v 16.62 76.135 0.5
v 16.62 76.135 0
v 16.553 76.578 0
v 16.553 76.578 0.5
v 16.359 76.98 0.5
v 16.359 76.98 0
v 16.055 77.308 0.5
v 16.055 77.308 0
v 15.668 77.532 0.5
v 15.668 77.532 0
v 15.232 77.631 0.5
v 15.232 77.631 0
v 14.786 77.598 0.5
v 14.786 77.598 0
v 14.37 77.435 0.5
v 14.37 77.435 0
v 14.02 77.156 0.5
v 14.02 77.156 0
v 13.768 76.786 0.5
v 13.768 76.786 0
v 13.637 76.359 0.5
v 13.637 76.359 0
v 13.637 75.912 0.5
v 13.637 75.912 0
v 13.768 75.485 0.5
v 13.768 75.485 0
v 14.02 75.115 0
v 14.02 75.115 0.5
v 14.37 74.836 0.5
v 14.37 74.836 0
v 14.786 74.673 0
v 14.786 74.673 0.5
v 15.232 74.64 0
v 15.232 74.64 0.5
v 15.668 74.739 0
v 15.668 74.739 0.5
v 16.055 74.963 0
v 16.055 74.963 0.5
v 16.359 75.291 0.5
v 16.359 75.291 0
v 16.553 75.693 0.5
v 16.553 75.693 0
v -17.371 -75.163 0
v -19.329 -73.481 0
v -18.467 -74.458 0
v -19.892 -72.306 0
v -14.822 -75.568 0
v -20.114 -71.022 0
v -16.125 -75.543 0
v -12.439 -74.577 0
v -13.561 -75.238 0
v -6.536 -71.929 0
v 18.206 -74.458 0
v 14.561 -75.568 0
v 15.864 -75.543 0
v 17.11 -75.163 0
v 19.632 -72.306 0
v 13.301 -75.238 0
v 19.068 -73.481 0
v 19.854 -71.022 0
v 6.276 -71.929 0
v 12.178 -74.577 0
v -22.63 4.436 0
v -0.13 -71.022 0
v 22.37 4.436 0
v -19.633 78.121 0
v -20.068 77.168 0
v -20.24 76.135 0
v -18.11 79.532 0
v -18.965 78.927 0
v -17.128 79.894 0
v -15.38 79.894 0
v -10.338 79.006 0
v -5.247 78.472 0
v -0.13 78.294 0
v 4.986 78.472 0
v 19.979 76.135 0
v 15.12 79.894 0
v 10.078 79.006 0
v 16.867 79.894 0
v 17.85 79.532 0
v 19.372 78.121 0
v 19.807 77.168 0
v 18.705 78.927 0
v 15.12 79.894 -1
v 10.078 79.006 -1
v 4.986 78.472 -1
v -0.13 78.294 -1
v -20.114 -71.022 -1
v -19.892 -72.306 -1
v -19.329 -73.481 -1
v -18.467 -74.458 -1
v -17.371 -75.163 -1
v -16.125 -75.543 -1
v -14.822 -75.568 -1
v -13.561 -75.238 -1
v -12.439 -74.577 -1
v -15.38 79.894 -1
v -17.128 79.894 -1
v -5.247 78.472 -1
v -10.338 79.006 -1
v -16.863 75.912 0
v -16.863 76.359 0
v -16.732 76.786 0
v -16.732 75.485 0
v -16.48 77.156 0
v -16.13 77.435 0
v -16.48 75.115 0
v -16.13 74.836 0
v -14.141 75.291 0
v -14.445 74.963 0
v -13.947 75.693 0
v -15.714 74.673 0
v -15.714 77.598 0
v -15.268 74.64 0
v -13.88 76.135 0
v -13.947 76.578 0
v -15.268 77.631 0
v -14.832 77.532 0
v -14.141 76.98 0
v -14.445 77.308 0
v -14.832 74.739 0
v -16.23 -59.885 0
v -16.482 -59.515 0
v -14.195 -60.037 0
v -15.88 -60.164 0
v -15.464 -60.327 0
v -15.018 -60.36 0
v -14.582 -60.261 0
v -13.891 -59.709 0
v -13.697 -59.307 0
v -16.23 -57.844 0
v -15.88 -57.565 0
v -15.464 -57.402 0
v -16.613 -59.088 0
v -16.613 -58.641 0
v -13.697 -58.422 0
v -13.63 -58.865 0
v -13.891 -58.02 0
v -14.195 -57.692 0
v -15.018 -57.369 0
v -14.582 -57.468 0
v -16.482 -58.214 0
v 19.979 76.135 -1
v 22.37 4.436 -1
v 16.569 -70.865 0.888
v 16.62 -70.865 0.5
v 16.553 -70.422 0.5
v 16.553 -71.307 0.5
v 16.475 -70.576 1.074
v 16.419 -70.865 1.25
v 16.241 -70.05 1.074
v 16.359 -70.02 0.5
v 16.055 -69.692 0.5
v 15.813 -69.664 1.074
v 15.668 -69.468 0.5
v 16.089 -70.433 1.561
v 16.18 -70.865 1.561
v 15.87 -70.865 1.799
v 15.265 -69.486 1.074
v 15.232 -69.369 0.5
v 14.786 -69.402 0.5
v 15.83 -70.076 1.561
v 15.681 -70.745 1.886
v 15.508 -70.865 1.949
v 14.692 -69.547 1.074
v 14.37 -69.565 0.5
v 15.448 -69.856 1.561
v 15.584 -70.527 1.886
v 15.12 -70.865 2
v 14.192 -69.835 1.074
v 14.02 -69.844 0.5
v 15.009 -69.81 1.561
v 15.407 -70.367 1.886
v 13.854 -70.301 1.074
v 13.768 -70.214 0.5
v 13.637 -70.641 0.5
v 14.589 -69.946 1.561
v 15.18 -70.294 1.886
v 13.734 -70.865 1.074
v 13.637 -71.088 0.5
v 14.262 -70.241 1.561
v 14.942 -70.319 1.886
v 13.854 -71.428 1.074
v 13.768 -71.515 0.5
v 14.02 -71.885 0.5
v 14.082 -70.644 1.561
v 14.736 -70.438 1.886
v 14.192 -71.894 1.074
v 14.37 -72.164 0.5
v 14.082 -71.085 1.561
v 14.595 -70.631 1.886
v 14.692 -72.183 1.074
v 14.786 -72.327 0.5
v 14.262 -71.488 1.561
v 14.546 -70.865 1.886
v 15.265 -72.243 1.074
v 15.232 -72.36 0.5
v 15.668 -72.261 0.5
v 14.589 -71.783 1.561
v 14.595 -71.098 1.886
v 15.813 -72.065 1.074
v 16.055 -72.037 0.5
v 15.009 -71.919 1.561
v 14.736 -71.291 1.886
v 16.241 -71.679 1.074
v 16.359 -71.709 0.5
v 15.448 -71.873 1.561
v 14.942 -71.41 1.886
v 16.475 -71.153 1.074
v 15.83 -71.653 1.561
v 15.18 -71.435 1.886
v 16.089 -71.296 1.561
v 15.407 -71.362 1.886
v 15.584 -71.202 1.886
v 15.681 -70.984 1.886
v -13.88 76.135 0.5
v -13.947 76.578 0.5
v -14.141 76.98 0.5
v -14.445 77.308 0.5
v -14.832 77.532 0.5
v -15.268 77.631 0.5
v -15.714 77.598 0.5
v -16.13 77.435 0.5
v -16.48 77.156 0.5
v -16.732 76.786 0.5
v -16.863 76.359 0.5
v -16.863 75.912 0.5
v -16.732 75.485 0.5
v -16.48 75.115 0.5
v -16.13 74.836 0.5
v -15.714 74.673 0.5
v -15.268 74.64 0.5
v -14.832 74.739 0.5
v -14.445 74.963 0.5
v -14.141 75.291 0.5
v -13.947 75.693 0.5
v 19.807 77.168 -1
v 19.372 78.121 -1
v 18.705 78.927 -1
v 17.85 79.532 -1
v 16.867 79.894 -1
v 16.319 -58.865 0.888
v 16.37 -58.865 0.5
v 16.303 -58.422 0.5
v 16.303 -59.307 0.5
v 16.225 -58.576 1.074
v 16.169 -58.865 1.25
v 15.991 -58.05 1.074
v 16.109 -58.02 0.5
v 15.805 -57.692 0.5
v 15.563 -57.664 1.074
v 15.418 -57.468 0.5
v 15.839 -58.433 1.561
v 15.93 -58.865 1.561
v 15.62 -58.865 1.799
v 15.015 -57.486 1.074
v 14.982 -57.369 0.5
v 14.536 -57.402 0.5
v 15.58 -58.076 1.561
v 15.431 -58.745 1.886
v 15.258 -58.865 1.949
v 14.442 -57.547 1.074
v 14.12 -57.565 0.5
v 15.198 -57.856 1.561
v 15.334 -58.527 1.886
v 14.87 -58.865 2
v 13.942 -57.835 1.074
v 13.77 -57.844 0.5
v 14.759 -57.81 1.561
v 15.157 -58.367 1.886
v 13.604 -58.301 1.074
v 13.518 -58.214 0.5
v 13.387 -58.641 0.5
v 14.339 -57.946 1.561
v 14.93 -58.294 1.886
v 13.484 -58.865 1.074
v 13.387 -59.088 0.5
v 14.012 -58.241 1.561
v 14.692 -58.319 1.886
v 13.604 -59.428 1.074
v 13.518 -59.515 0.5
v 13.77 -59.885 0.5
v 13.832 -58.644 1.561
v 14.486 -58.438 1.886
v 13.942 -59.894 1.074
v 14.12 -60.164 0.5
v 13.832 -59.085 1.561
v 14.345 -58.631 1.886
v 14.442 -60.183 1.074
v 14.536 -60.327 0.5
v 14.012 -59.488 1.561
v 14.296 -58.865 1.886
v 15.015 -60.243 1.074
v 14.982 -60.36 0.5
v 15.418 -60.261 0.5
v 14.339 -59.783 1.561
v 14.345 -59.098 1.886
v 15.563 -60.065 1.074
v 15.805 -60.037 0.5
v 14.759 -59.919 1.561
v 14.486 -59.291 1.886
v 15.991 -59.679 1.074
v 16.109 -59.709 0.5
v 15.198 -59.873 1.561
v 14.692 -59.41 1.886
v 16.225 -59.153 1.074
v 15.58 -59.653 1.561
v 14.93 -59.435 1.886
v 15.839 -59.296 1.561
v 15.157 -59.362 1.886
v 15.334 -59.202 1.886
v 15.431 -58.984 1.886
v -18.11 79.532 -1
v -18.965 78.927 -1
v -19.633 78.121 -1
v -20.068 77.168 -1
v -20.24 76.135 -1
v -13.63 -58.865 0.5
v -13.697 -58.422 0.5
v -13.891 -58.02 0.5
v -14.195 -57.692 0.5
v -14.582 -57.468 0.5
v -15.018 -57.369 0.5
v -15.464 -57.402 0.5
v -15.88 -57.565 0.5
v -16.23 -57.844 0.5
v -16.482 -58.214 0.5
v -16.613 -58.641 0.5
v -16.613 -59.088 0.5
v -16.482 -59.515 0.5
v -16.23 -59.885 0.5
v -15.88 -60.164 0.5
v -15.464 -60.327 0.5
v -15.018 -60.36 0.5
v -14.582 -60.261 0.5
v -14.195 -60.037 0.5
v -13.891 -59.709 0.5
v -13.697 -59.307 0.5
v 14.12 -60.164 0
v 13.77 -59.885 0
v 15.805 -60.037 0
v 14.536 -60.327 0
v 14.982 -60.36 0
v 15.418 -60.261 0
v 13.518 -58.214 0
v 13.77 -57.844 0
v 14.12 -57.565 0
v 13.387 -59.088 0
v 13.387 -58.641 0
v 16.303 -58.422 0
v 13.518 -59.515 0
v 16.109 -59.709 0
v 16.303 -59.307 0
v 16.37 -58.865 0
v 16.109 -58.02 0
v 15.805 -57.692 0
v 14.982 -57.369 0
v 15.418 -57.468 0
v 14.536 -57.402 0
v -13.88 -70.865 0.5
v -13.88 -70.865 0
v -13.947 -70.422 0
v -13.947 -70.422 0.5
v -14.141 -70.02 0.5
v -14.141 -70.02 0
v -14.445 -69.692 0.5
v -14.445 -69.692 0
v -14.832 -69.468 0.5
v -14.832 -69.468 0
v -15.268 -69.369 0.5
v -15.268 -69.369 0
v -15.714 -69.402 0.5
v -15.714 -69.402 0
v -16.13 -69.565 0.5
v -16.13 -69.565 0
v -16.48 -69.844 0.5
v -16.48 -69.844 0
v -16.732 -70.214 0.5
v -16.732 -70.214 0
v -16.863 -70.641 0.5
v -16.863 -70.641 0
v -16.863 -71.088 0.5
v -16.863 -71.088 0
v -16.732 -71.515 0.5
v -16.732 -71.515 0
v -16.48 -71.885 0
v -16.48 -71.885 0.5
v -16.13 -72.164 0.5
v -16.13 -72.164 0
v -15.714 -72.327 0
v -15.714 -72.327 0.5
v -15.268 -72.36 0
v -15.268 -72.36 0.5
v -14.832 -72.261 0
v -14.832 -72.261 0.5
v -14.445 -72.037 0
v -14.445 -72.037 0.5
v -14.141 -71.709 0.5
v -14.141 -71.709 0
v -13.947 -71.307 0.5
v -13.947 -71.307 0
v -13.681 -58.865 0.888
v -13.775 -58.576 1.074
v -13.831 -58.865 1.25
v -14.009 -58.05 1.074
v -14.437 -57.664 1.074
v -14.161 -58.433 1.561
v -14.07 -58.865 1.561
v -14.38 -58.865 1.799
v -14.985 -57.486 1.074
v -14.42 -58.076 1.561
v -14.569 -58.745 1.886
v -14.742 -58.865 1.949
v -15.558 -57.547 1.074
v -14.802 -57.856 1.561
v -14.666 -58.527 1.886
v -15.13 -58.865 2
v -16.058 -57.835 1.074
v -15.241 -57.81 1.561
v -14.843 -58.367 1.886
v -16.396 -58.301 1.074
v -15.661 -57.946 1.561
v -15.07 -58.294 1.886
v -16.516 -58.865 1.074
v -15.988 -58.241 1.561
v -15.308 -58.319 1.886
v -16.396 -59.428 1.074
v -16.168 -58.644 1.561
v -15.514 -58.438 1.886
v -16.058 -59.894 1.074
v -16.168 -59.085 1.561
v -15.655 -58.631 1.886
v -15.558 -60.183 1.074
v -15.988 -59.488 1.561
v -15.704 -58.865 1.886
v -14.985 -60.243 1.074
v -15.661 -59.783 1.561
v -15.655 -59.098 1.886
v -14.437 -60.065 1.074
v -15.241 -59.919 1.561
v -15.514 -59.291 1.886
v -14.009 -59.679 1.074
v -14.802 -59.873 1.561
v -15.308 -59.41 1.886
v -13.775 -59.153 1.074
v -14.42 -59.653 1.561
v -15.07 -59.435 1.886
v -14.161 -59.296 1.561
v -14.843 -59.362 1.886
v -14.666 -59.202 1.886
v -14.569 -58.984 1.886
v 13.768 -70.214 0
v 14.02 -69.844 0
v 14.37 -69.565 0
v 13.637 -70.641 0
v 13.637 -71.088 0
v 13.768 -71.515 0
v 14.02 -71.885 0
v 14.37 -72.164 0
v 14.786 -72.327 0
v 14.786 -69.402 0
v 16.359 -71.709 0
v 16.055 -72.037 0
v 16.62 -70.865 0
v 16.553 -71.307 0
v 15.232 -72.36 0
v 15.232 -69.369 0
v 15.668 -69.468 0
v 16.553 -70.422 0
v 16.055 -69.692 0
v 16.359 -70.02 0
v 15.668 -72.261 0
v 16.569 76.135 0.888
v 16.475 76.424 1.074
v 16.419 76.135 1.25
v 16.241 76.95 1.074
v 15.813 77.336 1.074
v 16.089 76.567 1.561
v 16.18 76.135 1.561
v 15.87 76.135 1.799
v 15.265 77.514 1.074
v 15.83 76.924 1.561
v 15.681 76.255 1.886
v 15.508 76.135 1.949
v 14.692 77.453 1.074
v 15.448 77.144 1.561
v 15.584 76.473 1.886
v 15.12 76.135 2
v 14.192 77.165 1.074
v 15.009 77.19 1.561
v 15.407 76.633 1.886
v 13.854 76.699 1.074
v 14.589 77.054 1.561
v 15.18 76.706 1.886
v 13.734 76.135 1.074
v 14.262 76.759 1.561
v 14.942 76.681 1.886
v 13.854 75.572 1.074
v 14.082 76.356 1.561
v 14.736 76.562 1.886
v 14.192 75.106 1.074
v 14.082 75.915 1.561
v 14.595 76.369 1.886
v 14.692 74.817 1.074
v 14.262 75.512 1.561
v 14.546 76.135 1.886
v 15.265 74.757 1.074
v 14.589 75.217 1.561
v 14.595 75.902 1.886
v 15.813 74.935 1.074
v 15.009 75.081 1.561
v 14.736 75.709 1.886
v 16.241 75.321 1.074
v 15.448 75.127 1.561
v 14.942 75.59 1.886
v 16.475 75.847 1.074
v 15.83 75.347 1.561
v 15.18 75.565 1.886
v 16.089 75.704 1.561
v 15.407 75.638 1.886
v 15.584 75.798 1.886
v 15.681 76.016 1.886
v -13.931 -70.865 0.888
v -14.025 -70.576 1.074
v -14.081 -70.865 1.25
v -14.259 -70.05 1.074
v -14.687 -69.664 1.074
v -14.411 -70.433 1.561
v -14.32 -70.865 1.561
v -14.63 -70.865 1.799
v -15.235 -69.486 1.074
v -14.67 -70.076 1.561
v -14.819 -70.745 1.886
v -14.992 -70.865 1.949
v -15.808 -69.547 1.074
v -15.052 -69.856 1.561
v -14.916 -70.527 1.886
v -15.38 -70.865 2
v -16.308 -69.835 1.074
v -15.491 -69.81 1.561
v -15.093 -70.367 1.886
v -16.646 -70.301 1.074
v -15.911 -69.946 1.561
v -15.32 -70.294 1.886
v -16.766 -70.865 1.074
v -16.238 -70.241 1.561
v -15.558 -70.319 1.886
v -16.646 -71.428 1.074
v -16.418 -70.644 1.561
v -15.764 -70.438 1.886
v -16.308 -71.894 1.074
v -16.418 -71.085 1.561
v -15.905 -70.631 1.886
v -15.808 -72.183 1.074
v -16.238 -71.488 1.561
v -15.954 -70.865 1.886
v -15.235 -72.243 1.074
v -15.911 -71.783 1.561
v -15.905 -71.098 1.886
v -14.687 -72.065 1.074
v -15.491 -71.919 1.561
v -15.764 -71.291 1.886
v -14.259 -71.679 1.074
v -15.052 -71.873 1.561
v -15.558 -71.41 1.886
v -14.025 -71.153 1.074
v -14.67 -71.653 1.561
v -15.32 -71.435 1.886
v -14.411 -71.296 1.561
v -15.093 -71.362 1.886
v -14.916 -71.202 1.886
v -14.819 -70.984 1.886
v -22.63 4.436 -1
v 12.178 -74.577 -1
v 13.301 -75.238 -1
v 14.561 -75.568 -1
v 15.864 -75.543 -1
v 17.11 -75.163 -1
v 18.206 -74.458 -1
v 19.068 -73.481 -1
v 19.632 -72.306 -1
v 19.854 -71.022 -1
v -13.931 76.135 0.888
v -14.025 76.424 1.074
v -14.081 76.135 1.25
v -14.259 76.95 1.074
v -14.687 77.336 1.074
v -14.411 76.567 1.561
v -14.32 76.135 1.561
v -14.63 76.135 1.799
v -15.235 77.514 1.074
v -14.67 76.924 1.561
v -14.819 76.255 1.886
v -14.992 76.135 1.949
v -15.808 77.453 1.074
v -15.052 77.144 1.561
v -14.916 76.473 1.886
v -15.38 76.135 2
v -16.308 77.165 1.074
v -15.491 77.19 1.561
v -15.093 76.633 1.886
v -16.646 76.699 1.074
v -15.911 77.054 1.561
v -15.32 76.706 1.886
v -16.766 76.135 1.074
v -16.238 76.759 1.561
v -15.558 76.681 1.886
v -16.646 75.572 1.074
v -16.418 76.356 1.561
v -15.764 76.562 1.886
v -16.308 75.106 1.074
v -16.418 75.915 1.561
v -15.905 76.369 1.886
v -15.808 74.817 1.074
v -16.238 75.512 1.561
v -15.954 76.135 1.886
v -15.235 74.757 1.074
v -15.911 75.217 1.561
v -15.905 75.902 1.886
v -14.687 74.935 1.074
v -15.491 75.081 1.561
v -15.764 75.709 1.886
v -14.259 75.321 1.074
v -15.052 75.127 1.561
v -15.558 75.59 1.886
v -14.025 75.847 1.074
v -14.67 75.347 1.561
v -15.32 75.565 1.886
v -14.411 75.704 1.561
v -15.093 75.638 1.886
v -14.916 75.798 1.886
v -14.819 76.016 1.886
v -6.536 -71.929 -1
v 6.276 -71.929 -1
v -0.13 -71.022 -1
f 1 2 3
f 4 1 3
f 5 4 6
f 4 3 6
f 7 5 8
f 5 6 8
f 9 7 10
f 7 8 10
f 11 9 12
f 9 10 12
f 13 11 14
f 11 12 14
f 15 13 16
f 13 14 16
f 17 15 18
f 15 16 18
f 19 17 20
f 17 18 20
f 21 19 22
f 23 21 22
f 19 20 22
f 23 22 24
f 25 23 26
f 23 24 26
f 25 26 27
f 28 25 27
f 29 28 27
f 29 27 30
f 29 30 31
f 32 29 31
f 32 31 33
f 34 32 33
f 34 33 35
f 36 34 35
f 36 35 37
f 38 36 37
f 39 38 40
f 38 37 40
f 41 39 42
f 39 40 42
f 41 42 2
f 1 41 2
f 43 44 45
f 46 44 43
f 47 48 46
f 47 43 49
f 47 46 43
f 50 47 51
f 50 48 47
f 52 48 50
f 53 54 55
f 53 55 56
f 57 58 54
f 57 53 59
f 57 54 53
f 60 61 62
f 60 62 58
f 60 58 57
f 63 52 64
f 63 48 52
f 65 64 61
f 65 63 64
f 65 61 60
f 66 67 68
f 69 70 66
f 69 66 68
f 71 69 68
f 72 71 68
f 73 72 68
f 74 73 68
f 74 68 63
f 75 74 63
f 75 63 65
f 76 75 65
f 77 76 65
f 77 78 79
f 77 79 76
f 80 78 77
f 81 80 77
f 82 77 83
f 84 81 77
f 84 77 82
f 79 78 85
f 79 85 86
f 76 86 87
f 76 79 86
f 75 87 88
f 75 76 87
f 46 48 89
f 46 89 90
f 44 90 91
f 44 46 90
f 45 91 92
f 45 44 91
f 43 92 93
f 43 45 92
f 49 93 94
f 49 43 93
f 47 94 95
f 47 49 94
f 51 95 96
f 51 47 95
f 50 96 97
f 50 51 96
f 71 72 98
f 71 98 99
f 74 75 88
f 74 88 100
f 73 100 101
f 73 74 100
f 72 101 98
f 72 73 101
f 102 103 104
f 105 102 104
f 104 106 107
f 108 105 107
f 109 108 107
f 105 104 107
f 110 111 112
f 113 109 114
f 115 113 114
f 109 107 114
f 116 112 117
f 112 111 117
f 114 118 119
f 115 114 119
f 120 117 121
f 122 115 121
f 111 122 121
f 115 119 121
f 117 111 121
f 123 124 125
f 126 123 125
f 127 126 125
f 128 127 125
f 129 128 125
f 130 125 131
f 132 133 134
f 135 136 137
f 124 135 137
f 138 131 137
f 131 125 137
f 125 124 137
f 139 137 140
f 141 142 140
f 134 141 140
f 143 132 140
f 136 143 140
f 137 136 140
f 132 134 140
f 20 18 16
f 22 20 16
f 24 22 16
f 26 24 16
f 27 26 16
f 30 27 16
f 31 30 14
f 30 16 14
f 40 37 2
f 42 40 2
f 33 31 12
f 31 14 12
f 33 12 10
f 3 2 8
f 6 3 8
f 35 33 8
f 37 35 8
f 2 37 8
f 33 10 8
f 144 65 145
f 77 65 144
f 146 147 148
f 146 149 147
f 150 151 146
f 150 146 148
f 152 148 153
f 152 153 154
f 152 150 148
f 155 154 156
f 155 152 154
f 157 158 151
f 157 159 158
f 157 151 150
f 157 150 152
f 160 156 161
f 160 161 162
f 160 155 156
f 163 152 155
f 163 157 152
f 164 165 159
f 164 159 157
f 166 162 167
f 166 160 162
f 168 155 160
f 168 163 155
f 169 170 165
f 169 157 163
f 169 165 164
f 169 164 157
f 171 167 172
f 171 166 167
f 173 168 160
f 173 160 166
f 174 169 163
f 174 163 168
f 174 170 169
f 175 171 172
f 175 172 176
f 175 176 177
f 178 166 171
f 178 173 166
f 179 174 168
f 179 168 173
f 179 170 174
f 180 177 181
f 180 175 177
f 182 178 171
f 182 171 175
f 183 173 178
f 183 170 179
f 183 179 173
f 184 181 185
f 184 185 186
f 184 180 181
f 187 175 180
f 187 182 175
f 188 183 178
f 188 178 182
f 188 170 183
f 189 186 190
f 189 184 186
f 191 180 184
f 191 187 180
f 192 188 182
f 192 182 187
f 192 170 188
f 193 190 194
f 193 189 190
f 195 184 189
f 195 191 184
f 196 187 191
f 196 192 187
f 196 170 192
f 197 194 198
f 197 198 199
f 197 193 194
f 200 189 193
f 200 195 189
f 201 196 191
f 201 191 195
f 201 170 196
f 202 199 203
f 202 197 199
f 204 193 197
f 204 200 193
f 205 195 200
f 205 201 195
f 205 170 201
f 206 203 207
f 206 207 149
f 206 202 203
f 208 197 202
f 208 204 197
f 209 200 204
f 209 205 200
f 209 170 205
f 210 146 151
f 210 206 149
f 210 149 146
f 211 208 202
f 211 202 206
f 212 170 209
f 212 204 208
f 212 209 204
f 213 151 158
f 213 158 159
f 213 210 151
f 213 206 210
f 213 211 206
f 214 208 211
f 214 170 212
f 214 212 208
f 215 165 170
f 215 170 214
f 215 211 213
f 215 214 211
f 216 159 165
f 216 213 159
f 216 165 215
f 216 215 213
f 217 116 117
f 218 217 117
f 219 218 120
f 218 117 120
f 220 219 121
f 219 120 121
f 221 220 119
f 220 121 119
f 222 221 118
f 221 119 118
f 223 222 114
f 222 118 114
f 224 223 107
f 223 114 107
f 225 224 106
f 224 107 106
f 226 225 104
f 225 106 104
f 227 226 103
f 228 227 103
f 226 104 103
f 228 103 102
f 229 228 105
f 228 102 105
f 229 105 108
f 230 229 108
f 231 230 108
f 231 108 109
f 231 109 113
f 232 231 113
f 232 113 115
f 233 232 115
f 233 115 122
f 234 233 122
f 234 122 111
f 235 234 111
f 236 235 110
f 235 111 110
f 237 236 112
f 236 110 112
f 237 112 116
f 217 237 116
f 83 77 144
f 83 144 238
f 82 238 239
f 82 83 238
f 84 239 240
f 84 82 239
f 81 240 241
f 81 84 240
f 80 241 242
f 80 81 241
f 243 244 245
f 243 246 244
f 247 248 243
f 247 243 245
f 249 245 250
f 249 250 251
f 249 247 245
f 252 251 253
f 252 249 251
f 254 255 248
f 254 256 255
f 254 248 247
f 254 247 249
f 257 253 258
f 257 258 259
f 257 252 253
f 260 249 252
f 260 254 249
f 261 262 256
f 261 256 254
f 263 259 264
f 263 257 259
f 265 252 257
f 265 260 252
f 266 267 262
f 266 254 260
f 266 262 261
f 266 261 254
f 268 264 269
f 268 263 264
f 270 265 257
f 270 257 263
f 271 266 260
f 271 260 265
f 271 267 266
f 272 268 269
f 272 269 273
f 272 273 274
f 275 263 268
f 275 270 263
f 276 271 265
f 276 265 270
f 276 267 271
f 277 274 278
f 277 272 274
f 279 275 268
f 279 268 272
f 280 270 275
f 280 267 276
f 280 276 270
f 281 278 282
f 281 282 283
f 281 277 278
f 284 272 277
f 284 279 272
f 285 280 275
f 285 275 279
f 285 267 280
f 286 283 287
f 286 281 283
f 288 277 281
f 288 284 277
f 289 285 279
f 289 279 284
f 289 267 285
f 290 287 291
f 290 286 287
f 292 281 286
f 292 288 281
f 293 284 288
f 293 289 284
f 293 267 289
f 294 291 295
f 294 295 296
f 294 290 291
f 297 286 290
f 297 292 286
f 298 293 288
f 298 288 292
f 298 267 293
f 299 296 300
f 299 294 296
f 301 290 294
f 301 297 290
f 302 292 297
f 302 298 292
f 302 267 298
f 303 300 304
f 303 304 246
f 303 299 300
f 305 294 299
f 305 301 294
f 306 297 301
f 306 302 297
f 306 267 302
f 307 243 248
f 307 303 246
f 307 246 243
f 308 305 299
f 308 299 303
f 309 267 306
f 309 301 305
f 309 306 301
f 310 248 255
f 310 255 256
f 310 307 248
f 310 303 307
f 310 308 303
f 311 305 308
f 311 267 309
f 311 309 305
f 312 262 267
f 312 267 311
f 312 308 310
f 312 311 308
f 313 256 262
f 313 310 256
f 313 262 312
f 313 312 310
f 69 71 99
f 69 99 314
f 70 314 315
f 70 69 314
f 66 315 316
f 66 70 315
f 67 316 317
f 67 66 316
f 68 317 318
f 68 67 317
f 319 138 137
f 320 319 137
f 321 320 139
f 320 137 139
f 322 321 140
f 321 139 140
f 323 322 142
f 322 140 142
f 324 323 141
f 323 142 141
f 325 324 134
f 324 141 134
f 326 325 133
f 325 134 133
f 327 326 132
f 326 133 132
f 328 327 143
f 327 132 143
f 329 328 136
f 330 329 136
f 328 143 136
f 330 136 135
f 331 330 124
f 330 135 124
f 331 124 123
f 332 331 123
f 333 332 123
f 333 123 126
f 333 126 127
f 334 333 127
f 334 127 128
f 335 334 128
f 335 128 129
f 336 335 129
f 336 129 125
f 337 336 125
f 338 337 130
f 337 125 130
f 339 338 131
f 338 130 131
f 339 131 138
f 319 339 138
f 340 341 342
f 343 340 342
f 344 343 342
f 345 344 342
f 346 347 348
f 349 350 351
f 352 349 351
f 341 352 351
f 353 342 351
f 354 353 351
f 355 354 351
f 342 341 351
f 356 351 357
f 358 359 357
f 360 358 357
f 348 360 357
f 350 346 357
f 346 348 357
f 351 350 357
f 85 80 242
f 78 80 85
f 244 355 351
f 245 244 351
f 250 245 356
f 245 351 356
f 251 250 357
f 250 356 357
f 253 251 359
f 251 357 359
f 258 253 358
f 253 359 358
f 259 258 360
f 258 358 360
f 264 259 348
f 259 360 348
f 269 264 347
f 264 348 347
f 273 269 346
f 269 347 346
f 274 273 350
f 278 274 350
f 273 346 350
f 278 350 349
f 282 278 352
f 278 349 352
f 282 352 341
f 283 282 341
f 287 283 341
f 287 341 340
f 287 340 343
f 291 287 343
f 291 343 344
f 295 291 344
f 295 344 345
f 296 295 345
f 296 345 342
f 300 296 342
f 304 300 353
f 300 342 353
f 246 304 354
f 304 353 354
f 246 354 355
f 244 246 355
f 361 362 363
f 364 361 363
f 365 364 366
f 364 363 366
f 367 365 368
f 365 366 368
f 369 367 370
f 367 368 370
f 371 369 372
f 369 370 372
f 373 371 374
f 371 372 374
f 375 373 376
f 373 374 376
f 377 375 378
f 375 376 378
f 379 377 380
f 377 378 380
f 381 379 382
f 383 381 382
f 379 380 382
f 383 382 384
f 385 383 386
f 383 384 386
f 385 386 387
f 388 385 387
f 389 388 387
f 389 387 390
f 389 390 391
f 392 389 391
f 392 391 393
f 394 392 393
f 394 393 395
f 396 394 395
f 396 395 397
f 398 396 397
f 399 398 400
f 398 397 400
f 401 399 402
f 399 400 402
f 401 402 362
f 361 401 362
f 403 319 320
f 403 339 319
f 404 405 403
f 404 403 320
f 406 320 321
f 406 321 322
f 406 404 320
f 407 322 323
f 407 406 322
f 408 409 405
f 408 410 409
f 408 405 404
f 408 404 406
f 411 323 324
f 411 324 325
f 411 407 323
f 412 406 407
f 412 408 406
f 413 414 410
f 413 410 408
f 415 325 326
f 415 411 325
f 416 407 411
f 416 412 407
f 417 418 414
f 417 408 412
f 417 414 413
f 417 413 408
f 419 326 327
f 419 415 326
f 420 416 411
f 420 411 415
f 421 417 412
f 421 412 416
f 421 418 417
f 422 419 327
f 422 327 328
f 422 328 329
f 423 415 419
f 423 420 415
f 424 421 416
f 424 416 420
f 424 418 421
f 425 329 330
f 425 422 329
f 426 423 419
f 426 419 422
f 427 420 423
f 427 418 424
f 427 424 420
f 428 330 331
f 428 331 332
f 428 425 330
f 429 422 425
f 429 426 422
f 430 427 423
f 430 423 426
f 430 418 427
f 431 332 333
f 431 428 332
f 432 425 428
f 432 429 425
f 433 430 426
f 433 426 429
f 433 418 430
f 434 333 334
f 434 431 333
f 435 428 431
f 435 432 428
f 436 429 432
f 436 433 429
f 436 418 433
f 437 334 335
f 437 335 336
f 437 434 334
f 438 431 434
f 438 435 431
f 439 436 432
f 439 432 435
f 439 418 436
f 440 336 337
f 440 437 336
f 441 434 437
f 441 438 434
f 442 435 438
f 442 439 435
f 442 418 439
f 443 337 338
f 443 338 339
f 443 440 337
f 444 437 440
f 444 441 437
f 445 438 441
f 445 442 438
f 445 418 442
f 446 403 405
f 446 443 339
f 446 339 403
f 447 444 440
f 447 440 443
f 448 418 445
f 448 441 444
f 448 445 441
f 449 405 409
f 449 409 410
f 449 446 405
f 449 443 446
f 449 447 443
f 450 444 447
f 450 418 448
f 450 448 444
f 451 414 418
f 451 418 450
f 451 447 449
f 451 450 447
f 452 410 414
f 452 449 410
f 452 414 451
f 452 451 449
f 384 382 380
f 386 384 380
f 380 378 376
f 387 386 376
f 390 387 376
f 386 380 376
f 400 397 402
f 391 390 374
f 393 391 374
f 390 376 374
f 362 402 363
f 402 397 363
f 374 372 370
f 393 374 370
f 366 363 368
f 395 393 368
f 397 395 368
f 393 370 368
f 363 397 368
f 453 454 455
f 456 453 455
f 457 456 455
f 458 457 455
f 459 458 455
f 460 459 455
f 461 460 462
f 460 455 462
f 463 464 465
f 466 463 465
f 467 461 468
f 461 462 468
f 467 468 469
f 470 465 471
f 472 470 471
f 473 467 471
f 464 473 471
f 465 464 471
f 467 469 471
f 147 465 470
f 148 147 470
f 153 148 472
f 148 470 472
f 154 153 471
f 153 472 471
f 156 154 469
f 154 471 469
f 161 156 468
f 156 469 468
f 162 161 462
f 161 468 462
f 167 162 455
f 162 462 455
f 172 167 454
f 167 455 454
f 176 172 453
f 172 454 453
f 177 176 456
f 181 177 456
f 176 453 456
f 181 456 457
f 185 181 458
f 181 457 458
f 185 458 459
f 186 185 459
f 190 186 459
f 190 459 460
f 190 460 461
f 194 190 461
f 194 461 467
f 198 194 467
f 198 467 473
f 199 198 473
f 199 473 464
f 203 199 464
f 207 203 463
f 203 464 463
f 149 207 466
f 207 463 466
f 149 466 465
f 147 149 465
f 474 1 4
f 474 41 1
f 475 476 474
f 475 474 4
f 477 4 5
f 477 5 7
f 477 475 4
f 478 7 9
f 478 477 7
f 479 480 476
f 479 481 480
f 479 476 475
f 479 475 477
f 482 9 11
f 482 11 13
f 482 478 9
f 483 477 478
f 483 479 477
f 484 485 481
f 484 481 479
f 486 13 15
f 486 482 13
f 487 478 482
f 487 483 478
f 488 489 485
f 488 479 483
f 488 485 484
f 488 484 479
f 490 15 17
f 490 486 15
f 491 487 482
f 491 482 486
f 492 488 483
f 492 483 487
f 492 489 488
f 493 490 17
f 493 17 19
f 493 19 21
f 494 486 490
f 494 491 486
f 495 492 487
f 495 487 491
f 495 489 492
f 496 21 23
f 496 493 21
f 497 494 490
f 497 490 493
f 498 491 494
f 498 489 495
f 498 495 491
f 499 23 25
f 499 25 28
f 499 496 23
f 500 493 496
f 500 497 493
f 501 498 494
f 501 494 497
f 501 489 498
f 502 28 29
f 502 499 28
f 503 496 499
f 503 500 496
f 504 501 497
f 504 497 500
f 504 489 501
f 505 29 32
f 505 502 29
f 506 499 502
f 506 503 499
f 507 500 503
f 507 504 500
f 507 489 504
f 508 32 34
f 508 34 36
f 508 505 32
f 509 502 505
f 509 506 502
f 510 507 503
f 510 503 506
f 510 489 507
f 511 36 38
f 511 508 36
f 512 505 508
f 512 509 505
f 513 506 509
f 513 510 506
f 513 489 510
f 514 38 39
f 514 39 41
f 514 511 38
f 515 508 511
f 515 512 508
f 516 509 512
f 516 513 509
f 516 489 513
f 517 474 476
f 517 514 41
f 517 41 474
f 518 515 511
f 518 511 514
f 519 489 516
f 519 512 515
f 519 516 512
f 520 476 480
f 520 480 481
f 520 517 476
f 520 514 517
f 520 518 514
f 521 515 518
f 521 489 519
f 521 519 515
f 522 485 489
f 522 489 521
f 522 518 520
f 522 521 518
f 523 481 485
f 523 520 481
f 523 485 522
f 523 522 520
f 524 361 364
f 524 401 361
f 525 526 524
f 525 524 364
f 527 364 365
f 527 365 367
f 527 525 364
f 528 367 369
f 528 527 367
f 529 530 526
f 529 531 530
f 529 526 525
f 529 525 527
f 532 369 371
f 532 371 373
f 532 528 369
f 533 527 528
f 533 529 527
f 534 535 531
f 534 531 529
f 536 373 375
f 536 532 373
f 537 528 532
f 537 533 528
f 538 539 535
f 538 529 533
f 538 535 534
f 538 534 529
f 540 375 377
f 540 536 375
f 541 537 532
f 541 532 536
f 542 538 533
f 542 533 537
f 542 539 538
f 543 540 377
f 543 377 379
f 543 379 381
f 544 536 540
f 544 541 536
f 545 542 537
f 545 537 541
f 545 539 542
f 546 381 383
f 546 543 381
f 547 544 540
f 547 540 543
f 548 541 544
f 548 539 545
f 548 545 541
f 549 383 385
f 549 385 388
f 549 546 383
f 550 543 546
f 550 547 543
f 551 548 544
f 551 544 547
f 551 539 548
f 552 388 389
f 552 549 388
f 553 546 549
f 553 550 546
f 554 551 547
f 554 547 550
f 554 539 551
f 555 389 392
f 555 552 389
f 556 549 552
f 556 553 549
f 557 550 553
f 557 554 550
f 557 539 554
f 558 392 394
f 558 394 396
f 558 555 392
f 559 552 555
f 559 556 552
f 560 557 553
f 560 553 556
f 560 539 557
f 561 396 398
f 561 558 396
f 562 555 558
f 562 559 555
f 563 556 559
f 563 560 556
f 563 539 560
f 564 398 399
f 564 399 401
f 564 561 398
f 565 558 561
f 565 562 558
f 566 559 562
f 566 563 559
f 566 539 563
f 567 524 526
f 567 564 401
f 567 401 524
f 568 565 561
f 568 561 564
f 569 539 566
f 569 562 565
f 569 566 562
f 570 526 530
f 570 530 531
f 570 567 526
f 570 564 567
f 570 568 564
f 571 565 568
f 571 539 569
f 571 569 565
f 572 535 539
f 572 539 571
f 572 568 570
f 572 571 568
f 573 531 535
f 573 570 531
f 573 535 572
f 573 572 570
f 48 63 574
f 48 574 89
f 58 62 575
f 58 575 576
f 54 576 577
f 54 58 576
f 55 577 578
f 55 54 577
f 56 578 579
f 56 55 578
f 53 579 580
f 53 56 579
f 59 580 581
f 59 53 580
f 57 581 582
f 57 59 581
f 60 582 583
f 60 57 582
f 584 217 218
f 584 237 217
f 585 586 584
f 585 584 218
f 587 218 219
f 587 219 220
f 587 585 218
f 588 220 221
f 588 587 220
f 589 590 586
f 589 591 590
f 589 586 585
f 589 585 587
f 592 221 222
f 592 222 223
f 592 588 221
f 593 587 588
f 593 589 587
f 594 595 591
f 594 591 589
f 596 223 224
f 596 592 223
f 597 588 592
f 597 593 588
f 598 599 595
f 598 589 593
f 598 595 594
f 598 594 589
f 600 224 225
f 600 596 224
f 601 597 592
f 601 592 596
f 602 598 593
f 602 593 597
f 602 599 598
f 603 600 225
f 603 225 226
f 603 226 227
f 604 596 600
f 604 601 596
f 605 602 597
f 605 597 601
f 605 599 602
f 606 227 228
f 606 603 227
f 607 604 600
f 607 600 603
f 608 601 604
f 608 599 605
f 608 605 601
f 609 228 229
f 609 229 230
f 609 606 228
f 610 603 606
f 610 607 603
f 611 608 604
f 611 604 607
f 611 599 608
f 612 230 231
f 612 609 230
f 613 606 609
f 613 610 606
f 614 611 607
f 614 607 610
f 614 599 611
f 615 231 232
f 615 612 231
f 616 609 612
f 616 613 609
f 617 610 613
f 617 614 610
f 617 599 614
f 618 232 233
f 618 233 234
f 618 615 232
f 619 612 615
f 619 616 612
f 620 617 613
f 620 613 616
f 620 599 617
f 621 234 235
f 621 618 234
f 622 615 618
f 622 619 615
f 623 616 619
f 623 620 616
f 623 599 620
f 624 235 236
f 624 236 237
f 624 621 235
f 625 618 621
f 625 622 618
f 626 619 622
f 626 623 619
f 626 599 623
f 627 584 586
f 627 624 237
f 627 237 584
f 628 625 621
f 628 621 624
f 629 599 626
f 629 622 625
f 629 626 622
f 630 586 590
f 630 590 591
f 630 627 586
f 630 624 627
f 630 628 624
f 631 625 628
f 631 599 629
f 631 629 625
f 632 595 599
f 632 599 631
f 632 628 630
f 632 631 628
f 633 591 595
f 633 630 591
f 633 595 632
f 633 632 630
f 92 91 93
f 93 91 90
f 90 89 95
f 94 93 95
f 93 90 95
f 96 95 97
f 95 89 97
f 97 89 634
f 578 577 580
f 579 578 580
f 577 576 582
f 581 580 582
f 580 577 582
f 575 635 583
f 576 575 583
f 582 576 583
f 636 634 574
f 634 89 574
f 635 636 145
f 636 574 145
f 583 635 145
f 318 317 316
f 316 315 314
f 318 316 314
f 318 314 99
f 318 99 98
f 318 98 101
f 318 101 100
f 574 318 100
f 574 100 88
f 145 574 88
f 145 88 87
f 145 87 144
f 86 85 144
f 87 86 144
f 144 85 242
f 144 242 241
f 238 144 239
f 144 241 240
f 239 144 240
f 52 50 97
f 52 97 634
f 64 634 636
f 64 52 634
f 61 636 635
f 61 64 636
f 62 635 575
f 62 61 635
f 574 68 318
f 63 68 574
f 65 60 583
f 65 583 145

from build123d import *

# Parameters (mm, degrees)
F0_R     = 1.5
F1_DEPTH = 2
F2_DEPTH = 1
F3_R     = 1.5


with BuildPart() as f1:
    # F0 (on Top) → F1 (new body)
    with BuildSketch(Plane.XY):
        with Locations((15.119787, -70.86451)):
            Circle(F0_R)
        with Locations((14.869787, -58.86451)):
            Circle(F0_R)
        with Locations((-15.380213, -70.86451)):
            Circle(F0_R)
        with Locations((-15.130213, -58.86451)):
            Circle(F0_R)
        with Locations((15.119787, 76.13549)):
            Circle(F0_R)
        with Locations((-15.380213, 76.13549)):
            Circle(F0_R)
    extrude(amount=F1_DEPTH)

    # F3
    f3_edges = [f1.edges().sort_by_distance(p)[0] for p in [
        (13.619787, 76.13549, 2),
        (-16.880213, 76.13549, 2),
        (13.369787, -58.86451, 2),
        (13.619787, -70.86451, 2),
        (-16.630213, -58.86451, 2),
        (-16.880213, -70.86451, 2),
    ]]
    fillet(f3_edges, radius=F3_R)


with BuildPart() as f2:
    # F0 (on Top) → F2 (new body)
    with BuildSketch(Plane.XY):
        with BuildLine():
            ThreePointArc((-17.127601, 79.893801), (-19.325559, 78.546167), (-20.23977, 76.13549))
            Line((-20.23977, 76.13549), (-22.630213, 4.435727))
            Line((-22.630213, 4.435727), (-20.114469, -71.022348))
            ThreePointArc((-20.114469, -71.022348), (-17.370904, -75.162794), (-12.438595, -74.577322))
            ThreePointArc((-12.438595, -74.577322), (-0.130213, -71.022348), (12.178169, -74.577322))
            ThreePointArc((12.178169, -74.577322), (17.110477, -75.162794), (19.854043, -71.022348))
            Line((19.854043, -71.022348), (22.369787, 4.435727))
            Line((22.369787, 4.435727), (19.979344, 76.13549))
            ThreePointArc((19.979344, 76.13549), (19.065133, 78.546167), (16.867174, 79.893801))
            Line((16.867174, 79.893801), (15.119787, 79.893801))
            ThreePointArc((15.119787, 79.893801), (7.536639, 78.694896), (-0.130213, 78.293801))
            ThreePointArc((-0.130213, 78.293801), (-7.797066, 78.694896), (-15.380213, 79.893801))
            Line((-15.380213, 79.893801), (-17.127601, 79.893801))
        make_face()
        with Locations((-15.380213, -70.86451)):
            Circle(F0_R, mode=Mode.SUBTRACT)
        with Locations((-15.130213, -58.86451)):
            Circle(F0_R, mode=Mode.SUBTRACT)
        with Locations((15.119787, -70.86451)):
            Circle(F0_R, mode=Mode.SUBTRACT)
        with Locations((14.869787, -58.86451)):
            Circle(F0_R, mode=Mode.SUBTRACT)
        with Locations((-15.380213, 76.13549)):
            Circle(F0_R, mode=Mode.SUBTRACT)
        with Locations((15.119787, 76.13549)):
            Circle(F0_R, mode=Mode.SUBTRACT)
        with Locations((-15.130213, -58.86451)):
            Circle(F0_R)
        with Locations((-15.380213, -70.86451)):
            Circle(F0_R)
        with Locations((15.119787, -70.86451)):
            Circle(F0_R)
        with Locations((14.869787, -58.86451)):
            Circle(F0_R)
        with Locations((15.119787, 76.13549)):
            Circle(F0_R)
        with Locations((-15.380213, 76.13549)):
            Circle(F0_R)
    extrude(amount=-F2_DEPTH)


solid = Compound([f1.part, f2.part])
